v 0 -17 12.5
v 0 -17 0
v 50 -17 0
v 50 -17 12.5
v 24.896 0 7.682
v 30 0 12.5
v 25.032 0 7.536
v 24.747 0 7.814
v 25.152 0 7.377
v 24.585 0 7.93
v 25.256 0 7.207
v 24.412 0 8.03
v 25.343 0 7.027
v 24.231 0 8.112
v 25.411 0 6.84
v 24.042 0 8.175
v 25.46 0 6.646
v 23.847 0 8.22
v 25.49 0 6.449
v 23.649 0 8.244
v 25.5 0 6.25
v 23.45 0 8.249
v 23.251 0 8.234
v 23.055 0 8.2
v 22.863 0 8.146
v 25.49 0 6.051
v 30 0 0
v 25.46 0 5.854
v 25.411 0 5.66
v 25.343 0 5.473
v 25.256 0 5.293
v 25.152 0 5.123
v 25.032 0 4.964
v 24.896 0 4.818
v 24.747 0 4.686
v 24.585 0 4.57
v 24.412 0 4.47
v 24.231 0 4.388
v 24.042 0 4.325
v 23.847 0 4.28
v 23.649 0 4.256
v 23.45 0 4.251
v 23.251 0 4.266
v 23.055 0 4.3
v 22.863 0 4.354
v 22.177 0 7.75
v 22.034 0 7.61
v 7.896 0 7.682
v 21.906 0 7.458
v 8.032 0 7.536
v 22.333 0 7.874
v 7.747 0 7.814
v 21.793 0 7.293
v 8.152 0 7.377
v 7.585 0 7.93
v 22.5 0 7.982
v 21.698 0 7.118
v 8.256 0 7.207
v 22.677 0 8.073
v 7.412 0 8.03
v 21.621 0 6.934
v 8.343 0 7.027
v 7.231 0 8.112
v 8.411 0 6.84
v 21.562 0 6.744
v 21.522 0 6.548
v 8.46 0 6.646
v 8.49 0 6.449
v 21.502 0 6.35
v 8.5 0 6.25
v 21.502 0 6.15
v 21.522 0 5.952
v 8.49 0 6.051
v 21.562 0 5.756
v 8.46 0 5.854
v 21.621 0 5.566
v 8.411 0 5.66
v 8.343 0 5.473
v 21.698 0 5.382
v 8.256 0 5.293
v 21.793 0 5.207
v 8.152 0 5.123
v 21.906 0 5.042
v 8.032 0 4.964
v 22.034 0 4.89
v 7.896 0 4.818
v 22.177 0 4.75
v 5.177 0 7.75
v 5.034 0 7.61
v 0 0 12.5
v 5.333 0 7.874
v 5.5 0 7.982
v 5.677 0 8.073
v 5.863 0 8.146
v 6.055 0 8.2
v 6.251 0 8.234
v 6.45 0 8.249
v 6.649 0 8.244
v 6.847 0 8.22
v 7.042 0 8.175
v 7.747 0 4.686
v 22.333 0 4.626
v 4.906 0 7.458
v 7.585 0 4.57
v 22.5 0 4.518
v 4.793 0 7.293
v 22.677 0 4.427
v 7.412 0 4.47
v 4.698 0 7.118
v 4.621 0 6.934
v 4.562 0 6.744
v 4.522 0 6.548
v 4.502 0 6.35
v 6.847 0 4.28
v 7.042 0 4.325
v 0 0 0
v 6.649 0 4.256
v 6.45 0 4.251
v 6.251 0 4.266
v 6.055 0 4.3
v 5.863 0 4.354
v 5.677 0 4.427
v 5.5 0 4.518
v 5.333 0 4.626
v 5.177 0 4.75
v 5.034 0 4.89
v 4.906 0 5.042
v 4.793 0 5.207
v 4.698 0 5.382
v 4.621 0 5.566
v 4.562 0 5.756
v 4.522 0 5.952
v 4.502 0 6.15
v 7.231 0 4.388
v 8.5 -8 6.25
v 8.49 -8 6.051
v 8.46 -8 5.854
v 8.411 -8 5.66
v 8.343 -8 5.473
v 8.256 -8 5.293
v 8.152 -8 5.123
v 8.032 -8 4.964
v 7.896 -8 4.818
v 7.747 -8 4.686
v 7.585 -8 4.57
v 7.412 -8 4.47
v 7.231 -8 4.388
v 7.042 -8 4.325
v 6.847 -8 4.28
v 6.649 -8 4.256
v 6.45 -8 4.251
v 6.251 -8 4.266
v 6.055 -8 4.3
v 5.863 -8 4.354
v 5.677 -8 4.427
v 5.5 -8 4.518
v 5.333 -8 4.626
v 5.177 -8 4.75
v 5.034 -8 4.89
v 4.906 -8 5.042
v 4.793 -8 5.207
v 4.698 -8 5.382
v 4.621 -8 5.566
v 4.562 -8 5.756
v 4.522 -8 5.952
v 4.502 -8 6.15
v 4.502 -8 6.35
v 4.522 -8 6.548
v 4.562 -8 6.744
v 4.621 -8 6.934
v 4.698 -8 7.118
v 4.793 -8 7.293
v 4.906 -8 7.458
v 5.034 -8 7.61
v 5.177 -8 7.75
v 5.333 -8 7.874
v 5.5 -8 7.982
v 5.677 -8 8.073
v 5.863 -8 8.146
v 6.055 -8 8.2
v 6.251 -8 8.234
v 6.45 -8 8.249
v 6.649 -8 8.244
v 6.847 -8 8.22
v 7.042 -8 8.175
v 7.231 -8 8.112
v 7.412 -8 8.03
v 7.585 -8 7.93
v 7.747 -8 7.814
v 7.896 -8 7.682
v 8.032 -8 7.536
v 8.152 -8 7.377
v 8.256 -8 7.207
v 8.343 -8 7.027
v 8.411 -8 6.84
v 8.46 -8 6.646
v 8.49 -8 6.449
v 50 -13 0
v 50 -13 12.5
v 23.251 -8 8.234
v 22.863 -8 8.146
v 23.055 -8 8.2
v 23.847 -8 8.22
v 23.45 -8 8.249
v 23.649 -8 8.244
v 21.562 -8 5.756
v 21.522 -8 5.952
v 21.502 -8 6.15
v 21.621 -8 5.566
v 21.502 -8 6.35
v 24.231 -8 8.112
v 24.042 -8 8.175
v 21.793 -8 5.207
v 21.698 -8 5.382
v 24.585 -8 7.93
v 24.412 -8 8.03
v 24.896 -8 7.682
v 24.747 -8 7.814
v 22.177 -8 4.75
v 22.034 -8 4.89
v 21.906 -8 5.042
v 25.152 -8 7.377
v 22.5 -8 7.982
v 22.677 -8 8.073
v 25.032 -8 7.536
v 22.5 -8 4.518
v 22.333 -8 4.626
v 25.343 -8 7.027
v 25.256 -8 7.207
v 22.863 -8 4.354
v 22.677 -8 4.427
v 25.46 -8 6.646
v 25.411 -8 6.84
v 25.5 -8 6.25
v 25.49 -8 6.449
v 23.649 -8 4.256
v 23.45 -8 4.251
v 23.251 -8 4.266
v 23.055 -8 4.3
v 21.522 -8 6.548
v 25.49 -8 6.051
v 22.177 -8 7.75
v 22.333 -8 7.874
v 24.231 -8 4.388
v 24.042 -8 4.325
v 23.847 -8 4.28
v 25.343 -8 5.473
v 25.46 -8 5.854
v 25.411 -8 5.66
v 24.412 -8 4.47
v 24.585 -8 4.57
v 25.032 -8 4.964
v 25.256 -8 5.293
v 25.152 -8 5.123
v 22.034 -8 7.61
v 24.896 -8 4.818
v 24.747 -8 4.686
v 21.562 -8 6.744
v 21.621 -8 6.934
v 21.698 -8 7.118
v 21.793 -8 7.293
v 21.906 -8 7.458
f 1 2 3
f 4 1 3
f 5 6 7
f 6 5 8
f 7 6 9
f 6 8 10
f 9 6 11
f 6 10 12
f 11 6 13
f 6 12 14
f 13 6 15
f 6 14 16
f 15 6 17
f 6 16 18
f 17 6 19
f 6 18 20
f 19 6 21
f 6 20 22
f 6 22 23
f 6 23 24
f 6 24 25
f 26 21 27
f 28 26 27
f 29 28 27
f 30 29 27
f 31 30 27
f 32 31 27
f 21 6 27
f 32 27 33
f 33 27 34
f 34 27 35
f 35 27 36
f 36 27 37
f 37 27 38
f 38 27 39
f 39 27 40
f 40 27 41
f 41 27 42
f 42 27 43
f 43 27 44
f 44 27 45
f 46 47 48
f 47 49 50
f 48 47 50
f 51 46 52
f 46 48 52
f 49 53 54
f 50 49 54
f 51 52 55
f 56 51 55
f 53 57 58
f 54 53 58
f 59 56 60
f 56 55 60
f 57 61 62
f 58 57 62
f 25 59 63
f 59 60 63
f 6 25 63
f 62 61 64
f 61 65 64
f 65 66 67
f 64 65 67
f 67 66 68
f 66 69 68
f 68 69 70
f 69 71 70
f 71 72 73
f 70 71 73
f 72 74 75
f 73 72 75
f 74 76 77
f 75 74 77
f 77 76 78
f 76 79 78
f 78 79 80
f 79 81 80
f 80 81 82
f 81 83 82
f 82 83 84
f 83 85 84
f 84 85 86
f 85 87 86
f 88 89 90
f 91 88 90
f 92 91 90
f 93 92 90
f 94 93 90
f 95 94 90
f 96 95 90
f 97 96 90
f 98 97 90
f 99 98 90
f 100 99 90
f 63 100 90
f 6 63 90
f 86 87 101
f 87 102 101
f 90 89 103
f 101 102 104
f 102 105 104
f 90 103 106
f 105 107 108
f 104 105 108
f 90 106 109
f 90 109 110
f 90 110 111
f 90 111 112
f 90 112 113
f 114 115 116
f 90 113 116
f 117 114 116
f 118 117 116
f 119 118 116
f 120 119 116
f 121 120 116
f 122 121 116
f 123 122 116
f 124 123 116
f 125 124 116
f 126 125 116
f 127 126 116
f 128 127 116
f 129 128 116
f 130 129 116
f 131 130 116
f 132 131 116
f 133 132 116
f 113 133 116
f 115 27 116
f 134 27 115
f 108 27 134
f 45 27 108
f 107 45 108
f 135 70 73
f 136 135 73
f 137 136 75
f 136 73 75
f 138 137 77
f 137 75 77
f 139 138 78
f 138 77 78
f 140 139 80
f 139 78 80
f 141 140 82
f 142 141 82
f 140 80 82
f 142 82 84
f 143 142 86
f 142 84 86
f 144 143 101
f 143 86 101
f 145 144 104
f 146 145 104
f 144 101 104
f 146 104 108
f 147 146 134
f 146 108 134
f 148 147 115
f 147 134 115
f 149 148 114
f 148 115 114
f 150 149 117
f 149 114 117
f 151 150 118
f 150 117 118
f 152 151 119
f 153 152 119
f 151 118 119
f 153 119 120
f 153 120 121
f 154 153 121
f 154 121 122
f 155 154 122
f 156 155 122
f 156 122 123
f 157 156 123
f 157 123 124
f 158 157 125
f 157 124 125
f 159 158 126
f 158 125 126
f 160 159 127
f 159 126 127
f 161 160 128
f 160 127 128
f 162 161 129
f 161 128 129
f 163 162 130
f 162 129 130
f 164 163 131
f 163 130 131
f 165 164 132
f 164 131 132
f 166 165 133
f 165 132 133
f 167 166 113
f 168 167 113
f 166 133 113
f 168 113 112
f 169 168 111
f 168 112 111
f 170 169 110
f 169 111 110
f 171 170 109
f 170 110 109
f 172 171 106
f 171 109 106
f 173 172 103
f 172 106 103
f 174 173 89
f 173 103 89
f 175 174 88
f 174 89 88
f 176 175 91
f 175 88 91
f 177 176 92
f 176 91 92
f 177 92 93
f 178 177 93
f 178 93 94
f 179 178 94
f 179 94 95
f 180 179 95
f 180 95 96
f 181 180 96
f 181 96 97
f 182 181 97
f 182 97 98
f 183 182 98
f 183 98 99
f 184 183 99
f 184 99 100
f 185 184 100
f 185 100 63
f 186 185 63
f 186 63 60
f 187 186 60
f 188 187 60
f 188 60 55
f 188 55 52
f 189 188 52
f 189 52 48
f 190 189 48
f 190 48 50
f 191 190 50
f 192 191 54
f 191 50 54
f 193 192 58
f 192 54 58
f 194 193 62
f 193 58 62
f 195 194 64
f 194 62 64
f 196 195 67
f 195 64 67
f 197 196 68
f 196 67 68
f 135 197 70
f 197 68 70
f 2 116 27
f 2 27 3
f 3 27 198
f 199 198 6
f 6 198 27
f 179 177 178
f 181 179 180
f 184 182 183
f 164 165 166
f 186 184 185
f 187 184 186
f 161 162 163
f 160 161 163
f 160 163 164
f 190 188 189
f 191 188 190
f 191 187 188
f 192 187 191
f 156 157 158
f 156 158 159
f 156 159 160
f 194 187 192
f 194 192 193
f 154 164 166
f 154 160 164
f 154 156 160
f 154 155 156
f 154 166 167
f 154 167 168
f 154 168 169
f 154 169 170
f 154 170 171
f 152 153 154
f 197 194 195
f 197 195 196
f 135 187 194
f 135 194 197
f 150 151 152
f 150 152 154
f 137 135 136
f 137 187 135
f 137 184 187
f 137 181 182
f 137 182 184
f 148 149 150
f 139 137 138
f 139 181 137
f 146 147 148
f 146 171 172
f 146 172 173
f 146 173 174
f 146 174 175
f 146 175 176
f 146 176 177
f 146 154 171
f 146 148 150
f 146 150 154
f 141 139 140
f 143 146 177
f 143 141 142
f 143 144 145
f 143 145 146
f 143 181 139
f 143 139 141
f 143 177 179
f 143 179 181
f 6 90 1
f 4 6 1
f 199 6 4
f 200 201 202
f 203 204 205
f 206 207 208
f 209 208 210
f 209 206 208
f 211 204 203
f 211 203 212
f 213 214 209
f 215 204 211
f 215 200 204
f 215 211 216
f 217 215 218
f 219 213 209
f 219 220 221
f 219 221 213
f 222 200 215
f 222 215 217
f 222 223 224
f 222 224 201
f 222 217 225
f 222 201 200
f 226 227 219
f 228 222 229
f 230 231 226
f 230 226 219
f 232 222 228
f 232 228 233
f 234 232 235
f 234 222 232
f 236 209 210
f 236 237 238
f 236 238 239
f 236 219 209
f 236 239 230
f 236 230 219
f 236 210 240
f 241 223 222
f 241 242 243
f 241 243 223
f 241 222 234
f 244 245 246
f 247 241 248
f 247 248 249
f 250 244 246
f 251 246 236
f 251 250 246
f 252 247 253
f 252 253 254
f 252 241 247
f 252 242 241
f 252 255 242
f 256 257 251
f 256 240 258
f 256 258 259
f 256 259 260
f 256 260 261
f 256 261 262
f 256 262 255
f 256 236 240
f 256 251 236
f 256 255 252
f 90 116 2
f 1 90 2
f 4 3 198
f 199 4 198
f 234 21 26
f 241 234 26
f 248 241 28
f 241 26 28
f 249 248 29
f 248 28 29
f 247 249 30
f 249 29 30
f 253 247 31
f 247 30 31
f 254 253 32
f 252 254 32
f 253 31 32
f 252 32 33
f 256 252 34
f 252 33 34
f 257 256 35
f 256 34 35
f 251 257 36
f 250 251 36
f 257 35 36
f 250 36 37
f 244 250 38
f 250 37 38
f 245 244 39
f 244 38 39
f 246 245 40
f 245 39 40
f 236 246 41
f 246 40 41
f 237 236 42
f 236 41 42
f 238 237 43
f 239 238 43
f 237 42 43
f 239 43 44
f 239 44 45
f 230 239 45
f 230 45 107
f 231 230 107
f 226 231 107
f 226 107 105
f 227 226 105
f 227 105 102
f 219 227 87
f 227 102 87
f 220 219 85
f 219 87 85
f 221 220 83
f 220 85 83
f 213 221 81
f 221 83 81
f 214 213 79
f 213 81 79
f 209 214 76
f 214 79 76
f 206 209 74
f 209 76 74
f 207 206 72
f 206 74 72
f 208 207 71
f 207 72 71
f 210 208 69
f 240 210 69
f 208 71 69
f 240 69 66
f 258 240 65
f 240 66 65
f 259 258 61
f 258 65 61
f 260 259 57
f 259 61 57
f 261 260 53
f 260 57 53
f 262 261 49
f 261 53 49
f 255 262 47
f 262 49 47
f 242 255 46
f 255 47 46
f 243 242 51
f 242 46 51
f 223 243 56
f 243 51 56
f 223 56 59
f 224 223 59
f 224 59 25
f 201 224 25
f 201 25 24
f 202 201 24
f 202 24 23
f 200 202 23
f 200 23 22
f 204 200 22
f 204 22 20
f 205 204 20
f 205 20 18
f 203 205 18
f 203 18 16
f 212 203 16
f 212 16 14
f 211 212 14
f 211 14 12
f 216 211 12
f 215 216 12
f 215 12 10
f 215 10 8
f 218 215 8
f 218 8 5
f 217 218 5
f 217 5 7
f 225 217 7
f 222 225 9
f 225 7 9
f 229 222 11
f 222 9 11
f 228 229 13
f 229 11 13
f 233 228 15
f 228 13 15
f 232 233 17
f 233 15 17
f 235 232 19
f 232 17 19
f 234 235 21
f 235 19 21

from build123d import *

# Parameters (mm, degrees)
BOSS_EXTRUDE1_DEPTH = 12.5
SKETCH2_R           = 2
CUT_EXTRUDE1_DEPTH  = 8


with BuildPart() as part:
    # Sketch1 → Boss-Extrude1 (new body)
    with BuildSketch(Plane.XY):
        Polygon((0, 0), (0, -17), (50, -17), (50, -13), (30, 0), align=None)
    extrude(amount=BOSS_EXTRUDE1_DEPTH)

    # Sketch2 → Cut-Extrude1 (cut)
    with BuildSketch(Plane(origin=(0, 0, 0), x_dir=(1, 0, 0), z_dir=(0, 1, 0))):
        with Locations((6.5, -6.25)):
            Circle(SKETCH2_R)
        with Locations((23.5, -6.25)):
            Circle(SKETCH2_R)
    extrude(amount=-CUT_EXTRUDE1_DEPTH, mode=Mode.SUBTRACT)


solid = part.part
